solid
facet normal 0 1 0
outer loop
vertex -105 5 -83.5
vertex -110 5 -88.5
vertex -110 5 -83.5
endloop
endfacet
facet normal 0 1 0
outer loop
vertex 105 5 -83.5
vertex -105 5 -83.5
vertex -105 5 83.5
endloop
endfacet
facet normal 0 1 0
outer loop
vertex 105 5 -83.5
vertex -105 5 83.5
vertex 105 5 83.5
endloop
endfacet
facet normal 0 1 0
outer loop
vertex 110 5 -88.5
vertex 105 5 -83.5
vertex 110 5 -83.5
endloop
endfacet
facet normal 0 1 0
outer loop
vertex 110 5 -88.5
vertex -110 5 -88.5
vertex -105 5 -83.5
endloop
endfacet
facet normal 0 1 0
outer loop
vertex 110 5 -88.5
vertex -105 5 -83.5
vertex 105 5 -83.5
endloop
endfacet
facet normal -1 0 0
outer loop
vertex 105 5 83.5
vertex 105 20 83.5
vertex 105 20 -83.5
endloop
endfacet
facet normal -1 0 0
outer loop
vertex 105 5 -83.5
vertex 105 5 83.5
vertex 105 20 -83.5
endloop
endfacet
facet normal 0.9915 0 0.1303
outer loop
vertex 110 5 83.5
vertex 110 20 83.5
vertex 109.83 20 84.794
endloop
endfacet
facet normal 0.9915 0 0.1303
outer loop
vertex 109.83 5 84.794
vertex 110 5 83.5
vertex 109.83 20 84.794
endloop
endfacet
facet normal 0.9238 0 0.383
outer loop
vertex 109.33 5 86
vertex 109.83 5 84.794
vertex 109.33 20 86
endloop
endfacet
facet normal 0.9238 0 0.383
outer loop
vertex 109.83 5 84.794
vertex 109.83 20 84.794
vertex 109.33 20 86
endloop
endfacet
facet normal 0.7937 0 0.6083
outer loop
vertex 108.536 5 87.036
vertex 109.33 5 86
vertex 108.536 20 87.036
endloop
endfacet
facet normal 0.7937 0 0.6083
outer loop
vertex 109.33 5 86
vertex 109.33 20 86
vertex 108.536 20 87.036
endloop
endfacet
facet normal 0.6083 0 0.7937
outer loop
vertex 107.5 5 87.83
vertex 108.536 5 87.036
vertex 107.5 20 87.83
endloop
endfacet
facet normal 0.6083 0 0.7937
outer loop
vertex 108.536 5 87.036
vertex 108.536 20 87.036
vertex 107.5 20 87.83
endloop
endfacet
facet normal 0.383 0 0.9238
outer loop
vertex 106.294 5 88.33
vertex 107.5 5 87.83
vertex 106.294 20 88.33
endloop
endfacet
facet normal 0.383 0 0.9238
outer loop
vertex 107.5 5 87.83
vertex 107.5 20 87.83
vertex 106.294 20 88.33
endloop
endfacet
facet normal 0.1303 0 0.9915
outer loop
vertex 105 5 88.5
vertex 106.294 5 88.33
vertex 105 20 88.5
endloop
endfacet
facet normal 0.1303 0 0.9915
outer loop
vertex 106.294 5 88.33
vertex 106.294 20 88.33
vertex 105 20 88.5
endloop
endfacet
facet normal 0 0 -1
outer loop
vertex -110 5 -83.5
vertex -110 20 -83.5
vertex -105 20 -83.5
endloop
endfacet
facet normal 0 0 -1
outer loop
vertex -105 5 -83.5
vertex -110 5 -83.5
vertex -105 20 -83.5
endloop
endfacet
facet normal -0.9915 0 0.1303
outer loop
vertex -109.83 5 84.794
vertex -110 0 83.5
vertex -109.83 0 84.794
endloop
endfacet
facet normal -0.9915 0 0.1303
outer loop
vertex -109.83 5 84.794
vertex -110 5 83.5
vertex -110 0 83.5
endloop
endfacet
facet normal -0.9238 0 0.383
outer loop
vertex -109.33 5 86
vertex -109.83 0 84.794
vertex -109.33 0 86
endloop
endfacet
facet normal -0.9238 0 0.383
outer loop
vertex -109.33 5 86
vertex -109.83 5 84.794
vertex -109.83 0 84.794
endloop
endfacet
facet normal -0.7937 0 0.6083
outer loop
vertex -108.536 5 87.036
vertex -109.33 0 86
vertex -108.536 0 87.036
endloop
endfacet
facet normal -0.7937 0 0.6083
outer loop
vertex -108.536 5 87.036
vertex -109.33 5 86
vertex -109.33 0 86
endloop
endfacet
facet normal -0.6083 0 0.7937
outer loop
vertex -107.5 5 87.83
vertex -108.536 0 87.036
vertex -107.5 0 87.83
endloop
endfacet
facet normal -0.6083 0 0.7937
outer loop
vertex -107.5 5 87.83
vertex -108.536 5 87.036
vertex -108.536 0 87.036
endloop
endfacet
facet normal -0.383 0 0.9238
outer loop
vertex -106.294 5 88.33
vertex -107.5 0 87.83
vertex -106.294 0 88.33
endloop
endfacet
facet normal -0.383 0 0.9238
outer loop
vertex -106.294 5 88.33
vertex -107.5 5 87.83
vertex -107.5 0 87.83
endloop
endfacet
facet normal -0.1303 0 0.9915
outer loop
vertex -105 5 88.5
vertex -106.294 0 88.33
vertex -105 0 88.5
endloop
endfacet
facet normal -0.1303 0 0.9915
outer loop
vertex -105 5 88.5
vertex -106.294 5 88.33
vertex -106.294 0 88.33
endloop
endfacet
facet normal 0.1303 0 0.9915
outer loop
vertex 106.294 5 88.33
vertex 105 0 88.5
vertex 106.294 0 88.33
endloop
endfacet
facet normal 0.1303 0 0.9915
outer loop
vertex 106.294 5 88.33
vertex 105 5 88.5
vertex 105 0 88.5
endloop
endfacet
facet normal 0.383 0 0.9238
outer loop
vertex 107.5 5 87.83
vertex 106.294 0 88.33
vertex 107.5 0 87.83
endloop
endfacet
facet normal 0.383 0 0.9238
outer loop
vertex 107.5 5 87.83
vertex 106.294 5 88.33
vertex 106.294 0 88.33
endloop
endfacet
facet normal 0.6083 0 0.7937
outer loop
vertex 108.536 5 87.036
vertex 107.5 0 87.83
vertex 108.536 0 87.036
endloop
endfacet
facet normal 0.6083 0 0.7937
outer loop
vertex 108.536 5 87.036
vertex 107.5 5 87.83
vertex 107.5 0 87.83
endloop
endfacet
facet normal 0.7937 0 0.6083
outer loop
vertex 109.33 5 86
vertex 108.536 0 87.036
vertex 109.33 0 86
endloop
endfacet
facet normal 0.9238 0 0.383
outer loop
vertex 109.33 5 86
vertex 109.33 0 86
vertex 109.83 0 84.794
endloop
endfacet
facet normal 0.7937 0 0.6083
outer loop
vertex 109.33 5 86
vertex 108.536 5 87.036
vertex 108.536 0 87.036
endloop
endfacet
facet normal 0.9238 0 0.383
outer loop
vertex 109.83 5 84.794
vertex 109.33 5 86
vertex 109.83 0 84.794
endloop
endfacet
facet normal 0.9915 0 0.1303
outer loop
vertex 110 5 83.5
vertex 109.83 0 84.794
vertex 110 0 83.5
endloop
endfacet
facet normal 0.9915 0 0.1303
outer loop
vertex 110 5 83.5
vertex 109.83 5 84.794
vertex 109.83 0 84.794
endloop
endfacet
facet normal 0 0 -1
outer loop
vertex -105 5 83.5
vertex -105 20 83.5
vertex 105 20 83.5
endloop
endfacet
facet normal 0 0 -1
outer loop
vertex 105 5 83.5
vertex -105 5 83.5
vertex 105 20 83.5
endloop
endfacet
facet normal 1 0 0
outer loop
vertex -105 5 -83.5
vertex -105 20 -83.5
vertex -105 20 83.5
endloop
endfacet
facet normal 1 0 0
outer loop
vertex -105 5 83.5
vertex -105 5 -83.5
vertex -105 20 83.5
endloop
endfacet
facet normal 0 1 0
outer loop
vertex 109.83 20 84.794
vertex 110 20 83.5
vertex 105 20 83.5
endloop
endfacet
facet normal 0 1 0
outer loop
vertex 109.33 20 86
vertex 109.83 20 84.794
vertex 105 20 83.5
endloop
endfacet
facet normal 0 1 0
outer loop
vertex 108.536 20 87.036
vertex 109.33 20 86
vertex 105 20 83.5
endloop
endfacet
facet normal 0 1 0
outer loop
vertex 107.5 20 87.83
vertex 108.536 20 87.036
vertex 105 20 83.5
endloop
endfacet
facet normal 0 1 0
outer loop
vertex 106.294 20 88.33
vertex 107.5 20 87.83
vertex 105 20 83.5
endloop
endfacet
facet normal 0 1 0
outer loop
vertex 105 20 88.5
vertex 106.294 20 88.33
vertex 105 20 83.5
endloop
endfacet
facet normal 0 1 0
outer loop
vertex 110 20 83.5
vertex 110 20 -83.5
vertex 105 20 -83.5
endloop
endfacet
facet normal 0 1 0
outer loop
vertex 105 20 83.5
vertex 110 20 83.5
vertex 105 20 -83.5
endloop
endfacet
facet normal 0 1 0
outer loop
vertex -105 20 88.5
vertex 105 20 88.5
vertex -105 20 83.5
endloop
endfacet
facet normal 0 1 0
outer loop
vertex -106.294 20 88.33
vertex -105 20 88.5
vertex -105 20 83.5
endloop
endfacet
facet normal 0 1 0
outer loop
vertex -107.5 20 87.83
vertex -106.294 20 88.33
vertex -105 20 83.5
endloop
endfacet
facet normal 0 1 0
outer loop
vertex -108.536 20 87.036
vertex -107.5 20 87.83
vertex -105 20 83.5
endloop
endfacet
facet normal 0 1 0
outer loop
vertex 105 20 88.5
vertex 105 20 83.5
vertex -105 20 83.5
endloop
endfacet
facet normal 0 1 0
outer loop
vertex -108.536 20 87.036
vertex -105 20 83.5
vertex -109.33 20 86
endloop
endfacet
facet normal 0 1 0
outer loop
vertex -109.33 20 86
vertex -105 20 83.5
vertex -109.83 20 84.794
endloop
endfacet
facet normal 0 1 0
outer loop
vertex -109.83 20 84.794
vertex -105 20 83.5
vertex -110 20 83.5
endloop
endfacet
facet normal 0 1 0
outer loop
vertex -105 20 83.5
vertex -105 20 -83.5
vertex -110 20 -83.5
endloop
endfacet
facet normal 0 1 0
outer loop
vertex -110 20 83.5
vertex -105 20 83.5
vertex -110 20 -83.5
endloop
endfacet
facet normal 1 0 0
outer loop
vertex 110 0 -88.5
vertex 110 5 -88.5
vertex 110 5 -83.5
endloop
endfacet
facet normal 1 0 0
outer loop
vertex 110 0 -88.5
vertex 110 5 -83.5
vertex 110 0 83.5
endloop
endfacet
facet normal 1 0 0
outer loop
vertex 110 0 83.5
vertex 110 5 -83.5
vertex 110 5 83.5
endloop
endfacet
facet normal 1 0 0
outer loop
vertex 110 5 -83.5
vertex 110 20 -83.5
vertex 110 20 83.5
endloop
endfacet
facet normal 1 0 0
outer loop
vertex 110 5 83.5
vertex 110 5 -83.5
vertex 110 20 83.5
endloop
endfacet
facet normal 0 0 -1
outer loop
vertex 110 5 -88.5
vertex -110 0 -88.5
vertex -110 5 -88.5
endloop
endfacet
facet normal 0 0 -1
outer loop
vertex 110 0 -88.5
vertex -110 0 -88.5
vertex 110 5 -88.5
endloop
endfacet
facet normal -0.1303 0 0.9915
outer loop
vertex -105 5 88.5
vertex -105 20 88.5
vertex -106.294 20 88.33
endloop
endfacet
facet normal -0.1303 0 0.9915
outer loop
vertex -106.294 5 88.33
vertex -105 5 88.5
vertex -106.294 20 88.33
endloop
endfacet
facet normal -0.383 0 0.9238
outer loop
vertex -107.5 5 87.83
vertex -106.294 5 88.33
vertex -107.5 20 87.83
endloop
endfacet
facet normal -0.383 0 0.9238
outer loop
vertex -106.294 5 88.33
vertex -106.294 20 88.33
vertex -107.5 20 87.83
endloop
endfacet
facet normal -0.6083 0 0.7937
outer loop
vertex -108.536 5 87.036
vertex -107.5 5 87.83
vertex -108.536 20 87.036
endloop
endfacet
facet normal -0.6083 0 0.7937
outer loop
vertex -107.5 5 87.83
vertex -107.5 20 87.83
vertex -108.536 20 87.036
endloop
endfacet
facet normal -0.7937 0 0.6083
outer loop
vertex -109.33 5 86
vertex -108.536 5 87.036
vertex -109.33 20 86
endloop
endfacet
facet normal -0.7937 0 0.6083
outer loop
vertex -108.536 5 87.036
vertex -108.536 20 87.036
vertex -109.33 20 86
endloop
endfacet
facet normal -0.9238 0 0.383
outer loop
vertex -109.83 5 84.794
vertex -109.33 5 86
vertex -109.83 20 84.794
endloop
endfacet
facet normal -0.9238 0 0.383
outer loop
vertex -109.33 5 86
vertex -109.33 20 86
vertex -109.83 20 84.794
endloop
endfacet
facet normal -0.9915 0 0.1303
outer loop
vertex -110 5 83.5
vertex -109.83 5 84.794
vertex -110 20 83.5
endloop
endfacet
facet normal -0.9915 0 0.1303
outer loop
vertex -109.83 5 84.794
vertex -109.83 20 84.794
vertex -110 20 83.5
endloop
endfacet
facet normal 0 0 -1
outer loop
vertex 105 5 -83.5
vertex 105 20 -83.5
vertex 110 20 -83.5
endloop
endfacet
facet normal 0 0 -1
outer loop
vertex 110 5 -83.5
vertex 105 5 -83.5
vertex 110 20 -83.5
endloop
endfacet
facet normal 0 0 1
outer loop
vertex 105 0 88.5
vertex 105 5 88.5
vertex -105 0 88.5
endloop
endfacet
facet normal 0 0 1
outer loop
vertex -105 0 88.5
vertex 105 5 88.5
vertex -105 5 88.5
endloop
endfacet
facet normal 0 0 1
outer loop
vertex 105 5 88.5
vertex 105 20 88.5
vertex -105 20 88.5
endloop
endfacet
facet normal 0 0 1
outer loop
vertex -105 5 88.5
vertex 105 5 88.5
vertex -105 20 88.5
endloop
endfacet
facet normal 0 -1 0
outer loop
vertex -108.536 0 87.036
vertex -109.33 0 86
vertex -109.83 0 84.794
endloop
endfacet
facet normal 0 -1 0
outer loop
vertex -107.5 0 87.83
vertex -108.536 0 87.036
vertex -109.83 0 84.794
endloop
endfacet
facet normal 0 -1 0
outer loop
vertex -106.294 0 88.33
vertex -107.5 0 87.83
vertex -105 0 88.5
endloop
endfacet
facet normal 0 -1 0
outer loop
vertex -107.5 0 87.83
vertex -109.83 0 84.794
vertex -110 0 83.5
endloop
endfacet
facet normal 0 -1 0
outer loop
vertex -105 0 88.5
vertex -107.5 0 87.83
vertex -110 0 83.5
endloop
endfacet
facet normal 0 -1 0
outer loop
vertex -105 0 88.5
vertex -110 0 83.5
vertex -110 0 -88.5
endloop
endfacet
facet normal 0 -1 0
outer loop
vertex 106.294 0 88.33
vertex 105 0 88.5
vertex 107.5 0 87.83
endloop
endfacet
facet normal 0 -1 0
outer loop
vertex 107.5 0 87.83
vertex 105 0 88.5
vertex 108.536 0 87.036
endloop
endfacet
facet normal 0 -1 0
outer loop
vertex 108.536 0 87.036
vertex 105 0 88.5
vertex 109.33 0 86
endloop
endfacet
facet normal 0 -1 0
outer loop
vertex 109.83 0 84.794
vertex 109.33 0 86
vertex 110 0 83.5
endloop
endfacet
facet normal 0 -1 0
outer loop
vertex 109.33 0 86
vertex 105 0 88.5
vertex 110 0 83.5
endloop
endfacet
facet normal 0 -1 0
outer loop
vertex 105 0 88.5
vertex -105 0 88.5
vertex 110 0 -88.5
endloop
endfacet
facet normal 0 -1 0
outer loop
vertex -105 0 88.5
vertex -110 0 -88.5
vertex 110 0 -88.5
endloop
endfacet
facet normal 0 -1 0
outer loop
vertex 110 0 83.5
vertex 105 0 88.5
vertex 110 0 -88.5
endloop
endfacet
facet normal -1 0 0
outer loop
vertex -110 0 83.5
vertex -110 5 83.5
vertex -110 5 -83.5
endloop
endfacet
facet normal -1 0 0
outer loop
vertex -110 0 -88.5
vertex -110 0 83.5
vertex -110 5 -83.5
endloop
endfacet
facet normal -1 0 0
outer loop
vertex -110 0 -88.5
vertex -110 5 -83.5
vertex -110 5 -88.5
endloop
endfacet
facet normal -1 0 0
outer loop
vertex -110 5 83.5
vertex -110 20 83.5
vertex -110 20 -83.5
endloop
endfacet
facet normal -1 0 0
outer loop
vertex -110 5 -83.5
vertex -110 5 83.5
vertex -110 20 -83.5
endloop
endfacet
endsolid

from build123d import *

# Parameters (mm, degrees)
SKETCH1_W           = 220
SKETCH1_H           = 177
BOSS_EXTRUDE1_DEPTH = 5
FILLET1_R           = 5
BOSS_EXTRUDE2_START = 15
BOSS_EXTRUDE2_DEPTH = 15


with BuildPart() as part:
    # Sketch1 → Boss-Extrude1 (new body)
    with BuildSketch(Plane(origin=(0, 0, 0), x_dir=(1, 0, 0), z_dir=(0, 1, 0))):
        Rectangle(SKETCH1_W, SKETCH1_H)
    extrude(amount=BOSS_EXTRUDE1_DEPTH)

    # Fillet1
    fillet1_edges = [part.edges().sort_by_distance(p)[0] for p in [
        (110, 2.5, 88.5),
        (-110, 2.5, 88.5),
    ]]
    fillet(fillet1_edges, radius=FILLET1_R)

    # Sketch3 → Boss-Extrude2 (add)
    with BuildSketch(Plane(origin=(0, 5, 0), x_dir=(1, 0, 0), z_dir=(0, 1, 0)).offset(BOSS_EXTRUDE2_START)):
        with BuildLine():
            Line((-105, 83.5), (-105, -83.5))
            Line((-105, -83.5), (105, -83.5))
            Line((105, -83.5), (105, 83.5))
            Line((105, 83.5), (110, 83.5))
            Line((110, 83.5), (110, -83.5))
            ThreePointArc((110, -83.5), (108.535533906, -87.035533906), (105, -88.5))
            Line((105, -88.5), (-105, -88.5))
            ThreePointArc((-105, -88.5), (-108.535533906, -87.035533906), (-110, -83.5))
            Line((-110, -83.5), (-110, 83.5))
            Line((-110, 83.5), (-105, 83.5))
        make_face()
    extrude(amount=-BOSS_EXTRUDE2_DEPTH)


solid = part.part
